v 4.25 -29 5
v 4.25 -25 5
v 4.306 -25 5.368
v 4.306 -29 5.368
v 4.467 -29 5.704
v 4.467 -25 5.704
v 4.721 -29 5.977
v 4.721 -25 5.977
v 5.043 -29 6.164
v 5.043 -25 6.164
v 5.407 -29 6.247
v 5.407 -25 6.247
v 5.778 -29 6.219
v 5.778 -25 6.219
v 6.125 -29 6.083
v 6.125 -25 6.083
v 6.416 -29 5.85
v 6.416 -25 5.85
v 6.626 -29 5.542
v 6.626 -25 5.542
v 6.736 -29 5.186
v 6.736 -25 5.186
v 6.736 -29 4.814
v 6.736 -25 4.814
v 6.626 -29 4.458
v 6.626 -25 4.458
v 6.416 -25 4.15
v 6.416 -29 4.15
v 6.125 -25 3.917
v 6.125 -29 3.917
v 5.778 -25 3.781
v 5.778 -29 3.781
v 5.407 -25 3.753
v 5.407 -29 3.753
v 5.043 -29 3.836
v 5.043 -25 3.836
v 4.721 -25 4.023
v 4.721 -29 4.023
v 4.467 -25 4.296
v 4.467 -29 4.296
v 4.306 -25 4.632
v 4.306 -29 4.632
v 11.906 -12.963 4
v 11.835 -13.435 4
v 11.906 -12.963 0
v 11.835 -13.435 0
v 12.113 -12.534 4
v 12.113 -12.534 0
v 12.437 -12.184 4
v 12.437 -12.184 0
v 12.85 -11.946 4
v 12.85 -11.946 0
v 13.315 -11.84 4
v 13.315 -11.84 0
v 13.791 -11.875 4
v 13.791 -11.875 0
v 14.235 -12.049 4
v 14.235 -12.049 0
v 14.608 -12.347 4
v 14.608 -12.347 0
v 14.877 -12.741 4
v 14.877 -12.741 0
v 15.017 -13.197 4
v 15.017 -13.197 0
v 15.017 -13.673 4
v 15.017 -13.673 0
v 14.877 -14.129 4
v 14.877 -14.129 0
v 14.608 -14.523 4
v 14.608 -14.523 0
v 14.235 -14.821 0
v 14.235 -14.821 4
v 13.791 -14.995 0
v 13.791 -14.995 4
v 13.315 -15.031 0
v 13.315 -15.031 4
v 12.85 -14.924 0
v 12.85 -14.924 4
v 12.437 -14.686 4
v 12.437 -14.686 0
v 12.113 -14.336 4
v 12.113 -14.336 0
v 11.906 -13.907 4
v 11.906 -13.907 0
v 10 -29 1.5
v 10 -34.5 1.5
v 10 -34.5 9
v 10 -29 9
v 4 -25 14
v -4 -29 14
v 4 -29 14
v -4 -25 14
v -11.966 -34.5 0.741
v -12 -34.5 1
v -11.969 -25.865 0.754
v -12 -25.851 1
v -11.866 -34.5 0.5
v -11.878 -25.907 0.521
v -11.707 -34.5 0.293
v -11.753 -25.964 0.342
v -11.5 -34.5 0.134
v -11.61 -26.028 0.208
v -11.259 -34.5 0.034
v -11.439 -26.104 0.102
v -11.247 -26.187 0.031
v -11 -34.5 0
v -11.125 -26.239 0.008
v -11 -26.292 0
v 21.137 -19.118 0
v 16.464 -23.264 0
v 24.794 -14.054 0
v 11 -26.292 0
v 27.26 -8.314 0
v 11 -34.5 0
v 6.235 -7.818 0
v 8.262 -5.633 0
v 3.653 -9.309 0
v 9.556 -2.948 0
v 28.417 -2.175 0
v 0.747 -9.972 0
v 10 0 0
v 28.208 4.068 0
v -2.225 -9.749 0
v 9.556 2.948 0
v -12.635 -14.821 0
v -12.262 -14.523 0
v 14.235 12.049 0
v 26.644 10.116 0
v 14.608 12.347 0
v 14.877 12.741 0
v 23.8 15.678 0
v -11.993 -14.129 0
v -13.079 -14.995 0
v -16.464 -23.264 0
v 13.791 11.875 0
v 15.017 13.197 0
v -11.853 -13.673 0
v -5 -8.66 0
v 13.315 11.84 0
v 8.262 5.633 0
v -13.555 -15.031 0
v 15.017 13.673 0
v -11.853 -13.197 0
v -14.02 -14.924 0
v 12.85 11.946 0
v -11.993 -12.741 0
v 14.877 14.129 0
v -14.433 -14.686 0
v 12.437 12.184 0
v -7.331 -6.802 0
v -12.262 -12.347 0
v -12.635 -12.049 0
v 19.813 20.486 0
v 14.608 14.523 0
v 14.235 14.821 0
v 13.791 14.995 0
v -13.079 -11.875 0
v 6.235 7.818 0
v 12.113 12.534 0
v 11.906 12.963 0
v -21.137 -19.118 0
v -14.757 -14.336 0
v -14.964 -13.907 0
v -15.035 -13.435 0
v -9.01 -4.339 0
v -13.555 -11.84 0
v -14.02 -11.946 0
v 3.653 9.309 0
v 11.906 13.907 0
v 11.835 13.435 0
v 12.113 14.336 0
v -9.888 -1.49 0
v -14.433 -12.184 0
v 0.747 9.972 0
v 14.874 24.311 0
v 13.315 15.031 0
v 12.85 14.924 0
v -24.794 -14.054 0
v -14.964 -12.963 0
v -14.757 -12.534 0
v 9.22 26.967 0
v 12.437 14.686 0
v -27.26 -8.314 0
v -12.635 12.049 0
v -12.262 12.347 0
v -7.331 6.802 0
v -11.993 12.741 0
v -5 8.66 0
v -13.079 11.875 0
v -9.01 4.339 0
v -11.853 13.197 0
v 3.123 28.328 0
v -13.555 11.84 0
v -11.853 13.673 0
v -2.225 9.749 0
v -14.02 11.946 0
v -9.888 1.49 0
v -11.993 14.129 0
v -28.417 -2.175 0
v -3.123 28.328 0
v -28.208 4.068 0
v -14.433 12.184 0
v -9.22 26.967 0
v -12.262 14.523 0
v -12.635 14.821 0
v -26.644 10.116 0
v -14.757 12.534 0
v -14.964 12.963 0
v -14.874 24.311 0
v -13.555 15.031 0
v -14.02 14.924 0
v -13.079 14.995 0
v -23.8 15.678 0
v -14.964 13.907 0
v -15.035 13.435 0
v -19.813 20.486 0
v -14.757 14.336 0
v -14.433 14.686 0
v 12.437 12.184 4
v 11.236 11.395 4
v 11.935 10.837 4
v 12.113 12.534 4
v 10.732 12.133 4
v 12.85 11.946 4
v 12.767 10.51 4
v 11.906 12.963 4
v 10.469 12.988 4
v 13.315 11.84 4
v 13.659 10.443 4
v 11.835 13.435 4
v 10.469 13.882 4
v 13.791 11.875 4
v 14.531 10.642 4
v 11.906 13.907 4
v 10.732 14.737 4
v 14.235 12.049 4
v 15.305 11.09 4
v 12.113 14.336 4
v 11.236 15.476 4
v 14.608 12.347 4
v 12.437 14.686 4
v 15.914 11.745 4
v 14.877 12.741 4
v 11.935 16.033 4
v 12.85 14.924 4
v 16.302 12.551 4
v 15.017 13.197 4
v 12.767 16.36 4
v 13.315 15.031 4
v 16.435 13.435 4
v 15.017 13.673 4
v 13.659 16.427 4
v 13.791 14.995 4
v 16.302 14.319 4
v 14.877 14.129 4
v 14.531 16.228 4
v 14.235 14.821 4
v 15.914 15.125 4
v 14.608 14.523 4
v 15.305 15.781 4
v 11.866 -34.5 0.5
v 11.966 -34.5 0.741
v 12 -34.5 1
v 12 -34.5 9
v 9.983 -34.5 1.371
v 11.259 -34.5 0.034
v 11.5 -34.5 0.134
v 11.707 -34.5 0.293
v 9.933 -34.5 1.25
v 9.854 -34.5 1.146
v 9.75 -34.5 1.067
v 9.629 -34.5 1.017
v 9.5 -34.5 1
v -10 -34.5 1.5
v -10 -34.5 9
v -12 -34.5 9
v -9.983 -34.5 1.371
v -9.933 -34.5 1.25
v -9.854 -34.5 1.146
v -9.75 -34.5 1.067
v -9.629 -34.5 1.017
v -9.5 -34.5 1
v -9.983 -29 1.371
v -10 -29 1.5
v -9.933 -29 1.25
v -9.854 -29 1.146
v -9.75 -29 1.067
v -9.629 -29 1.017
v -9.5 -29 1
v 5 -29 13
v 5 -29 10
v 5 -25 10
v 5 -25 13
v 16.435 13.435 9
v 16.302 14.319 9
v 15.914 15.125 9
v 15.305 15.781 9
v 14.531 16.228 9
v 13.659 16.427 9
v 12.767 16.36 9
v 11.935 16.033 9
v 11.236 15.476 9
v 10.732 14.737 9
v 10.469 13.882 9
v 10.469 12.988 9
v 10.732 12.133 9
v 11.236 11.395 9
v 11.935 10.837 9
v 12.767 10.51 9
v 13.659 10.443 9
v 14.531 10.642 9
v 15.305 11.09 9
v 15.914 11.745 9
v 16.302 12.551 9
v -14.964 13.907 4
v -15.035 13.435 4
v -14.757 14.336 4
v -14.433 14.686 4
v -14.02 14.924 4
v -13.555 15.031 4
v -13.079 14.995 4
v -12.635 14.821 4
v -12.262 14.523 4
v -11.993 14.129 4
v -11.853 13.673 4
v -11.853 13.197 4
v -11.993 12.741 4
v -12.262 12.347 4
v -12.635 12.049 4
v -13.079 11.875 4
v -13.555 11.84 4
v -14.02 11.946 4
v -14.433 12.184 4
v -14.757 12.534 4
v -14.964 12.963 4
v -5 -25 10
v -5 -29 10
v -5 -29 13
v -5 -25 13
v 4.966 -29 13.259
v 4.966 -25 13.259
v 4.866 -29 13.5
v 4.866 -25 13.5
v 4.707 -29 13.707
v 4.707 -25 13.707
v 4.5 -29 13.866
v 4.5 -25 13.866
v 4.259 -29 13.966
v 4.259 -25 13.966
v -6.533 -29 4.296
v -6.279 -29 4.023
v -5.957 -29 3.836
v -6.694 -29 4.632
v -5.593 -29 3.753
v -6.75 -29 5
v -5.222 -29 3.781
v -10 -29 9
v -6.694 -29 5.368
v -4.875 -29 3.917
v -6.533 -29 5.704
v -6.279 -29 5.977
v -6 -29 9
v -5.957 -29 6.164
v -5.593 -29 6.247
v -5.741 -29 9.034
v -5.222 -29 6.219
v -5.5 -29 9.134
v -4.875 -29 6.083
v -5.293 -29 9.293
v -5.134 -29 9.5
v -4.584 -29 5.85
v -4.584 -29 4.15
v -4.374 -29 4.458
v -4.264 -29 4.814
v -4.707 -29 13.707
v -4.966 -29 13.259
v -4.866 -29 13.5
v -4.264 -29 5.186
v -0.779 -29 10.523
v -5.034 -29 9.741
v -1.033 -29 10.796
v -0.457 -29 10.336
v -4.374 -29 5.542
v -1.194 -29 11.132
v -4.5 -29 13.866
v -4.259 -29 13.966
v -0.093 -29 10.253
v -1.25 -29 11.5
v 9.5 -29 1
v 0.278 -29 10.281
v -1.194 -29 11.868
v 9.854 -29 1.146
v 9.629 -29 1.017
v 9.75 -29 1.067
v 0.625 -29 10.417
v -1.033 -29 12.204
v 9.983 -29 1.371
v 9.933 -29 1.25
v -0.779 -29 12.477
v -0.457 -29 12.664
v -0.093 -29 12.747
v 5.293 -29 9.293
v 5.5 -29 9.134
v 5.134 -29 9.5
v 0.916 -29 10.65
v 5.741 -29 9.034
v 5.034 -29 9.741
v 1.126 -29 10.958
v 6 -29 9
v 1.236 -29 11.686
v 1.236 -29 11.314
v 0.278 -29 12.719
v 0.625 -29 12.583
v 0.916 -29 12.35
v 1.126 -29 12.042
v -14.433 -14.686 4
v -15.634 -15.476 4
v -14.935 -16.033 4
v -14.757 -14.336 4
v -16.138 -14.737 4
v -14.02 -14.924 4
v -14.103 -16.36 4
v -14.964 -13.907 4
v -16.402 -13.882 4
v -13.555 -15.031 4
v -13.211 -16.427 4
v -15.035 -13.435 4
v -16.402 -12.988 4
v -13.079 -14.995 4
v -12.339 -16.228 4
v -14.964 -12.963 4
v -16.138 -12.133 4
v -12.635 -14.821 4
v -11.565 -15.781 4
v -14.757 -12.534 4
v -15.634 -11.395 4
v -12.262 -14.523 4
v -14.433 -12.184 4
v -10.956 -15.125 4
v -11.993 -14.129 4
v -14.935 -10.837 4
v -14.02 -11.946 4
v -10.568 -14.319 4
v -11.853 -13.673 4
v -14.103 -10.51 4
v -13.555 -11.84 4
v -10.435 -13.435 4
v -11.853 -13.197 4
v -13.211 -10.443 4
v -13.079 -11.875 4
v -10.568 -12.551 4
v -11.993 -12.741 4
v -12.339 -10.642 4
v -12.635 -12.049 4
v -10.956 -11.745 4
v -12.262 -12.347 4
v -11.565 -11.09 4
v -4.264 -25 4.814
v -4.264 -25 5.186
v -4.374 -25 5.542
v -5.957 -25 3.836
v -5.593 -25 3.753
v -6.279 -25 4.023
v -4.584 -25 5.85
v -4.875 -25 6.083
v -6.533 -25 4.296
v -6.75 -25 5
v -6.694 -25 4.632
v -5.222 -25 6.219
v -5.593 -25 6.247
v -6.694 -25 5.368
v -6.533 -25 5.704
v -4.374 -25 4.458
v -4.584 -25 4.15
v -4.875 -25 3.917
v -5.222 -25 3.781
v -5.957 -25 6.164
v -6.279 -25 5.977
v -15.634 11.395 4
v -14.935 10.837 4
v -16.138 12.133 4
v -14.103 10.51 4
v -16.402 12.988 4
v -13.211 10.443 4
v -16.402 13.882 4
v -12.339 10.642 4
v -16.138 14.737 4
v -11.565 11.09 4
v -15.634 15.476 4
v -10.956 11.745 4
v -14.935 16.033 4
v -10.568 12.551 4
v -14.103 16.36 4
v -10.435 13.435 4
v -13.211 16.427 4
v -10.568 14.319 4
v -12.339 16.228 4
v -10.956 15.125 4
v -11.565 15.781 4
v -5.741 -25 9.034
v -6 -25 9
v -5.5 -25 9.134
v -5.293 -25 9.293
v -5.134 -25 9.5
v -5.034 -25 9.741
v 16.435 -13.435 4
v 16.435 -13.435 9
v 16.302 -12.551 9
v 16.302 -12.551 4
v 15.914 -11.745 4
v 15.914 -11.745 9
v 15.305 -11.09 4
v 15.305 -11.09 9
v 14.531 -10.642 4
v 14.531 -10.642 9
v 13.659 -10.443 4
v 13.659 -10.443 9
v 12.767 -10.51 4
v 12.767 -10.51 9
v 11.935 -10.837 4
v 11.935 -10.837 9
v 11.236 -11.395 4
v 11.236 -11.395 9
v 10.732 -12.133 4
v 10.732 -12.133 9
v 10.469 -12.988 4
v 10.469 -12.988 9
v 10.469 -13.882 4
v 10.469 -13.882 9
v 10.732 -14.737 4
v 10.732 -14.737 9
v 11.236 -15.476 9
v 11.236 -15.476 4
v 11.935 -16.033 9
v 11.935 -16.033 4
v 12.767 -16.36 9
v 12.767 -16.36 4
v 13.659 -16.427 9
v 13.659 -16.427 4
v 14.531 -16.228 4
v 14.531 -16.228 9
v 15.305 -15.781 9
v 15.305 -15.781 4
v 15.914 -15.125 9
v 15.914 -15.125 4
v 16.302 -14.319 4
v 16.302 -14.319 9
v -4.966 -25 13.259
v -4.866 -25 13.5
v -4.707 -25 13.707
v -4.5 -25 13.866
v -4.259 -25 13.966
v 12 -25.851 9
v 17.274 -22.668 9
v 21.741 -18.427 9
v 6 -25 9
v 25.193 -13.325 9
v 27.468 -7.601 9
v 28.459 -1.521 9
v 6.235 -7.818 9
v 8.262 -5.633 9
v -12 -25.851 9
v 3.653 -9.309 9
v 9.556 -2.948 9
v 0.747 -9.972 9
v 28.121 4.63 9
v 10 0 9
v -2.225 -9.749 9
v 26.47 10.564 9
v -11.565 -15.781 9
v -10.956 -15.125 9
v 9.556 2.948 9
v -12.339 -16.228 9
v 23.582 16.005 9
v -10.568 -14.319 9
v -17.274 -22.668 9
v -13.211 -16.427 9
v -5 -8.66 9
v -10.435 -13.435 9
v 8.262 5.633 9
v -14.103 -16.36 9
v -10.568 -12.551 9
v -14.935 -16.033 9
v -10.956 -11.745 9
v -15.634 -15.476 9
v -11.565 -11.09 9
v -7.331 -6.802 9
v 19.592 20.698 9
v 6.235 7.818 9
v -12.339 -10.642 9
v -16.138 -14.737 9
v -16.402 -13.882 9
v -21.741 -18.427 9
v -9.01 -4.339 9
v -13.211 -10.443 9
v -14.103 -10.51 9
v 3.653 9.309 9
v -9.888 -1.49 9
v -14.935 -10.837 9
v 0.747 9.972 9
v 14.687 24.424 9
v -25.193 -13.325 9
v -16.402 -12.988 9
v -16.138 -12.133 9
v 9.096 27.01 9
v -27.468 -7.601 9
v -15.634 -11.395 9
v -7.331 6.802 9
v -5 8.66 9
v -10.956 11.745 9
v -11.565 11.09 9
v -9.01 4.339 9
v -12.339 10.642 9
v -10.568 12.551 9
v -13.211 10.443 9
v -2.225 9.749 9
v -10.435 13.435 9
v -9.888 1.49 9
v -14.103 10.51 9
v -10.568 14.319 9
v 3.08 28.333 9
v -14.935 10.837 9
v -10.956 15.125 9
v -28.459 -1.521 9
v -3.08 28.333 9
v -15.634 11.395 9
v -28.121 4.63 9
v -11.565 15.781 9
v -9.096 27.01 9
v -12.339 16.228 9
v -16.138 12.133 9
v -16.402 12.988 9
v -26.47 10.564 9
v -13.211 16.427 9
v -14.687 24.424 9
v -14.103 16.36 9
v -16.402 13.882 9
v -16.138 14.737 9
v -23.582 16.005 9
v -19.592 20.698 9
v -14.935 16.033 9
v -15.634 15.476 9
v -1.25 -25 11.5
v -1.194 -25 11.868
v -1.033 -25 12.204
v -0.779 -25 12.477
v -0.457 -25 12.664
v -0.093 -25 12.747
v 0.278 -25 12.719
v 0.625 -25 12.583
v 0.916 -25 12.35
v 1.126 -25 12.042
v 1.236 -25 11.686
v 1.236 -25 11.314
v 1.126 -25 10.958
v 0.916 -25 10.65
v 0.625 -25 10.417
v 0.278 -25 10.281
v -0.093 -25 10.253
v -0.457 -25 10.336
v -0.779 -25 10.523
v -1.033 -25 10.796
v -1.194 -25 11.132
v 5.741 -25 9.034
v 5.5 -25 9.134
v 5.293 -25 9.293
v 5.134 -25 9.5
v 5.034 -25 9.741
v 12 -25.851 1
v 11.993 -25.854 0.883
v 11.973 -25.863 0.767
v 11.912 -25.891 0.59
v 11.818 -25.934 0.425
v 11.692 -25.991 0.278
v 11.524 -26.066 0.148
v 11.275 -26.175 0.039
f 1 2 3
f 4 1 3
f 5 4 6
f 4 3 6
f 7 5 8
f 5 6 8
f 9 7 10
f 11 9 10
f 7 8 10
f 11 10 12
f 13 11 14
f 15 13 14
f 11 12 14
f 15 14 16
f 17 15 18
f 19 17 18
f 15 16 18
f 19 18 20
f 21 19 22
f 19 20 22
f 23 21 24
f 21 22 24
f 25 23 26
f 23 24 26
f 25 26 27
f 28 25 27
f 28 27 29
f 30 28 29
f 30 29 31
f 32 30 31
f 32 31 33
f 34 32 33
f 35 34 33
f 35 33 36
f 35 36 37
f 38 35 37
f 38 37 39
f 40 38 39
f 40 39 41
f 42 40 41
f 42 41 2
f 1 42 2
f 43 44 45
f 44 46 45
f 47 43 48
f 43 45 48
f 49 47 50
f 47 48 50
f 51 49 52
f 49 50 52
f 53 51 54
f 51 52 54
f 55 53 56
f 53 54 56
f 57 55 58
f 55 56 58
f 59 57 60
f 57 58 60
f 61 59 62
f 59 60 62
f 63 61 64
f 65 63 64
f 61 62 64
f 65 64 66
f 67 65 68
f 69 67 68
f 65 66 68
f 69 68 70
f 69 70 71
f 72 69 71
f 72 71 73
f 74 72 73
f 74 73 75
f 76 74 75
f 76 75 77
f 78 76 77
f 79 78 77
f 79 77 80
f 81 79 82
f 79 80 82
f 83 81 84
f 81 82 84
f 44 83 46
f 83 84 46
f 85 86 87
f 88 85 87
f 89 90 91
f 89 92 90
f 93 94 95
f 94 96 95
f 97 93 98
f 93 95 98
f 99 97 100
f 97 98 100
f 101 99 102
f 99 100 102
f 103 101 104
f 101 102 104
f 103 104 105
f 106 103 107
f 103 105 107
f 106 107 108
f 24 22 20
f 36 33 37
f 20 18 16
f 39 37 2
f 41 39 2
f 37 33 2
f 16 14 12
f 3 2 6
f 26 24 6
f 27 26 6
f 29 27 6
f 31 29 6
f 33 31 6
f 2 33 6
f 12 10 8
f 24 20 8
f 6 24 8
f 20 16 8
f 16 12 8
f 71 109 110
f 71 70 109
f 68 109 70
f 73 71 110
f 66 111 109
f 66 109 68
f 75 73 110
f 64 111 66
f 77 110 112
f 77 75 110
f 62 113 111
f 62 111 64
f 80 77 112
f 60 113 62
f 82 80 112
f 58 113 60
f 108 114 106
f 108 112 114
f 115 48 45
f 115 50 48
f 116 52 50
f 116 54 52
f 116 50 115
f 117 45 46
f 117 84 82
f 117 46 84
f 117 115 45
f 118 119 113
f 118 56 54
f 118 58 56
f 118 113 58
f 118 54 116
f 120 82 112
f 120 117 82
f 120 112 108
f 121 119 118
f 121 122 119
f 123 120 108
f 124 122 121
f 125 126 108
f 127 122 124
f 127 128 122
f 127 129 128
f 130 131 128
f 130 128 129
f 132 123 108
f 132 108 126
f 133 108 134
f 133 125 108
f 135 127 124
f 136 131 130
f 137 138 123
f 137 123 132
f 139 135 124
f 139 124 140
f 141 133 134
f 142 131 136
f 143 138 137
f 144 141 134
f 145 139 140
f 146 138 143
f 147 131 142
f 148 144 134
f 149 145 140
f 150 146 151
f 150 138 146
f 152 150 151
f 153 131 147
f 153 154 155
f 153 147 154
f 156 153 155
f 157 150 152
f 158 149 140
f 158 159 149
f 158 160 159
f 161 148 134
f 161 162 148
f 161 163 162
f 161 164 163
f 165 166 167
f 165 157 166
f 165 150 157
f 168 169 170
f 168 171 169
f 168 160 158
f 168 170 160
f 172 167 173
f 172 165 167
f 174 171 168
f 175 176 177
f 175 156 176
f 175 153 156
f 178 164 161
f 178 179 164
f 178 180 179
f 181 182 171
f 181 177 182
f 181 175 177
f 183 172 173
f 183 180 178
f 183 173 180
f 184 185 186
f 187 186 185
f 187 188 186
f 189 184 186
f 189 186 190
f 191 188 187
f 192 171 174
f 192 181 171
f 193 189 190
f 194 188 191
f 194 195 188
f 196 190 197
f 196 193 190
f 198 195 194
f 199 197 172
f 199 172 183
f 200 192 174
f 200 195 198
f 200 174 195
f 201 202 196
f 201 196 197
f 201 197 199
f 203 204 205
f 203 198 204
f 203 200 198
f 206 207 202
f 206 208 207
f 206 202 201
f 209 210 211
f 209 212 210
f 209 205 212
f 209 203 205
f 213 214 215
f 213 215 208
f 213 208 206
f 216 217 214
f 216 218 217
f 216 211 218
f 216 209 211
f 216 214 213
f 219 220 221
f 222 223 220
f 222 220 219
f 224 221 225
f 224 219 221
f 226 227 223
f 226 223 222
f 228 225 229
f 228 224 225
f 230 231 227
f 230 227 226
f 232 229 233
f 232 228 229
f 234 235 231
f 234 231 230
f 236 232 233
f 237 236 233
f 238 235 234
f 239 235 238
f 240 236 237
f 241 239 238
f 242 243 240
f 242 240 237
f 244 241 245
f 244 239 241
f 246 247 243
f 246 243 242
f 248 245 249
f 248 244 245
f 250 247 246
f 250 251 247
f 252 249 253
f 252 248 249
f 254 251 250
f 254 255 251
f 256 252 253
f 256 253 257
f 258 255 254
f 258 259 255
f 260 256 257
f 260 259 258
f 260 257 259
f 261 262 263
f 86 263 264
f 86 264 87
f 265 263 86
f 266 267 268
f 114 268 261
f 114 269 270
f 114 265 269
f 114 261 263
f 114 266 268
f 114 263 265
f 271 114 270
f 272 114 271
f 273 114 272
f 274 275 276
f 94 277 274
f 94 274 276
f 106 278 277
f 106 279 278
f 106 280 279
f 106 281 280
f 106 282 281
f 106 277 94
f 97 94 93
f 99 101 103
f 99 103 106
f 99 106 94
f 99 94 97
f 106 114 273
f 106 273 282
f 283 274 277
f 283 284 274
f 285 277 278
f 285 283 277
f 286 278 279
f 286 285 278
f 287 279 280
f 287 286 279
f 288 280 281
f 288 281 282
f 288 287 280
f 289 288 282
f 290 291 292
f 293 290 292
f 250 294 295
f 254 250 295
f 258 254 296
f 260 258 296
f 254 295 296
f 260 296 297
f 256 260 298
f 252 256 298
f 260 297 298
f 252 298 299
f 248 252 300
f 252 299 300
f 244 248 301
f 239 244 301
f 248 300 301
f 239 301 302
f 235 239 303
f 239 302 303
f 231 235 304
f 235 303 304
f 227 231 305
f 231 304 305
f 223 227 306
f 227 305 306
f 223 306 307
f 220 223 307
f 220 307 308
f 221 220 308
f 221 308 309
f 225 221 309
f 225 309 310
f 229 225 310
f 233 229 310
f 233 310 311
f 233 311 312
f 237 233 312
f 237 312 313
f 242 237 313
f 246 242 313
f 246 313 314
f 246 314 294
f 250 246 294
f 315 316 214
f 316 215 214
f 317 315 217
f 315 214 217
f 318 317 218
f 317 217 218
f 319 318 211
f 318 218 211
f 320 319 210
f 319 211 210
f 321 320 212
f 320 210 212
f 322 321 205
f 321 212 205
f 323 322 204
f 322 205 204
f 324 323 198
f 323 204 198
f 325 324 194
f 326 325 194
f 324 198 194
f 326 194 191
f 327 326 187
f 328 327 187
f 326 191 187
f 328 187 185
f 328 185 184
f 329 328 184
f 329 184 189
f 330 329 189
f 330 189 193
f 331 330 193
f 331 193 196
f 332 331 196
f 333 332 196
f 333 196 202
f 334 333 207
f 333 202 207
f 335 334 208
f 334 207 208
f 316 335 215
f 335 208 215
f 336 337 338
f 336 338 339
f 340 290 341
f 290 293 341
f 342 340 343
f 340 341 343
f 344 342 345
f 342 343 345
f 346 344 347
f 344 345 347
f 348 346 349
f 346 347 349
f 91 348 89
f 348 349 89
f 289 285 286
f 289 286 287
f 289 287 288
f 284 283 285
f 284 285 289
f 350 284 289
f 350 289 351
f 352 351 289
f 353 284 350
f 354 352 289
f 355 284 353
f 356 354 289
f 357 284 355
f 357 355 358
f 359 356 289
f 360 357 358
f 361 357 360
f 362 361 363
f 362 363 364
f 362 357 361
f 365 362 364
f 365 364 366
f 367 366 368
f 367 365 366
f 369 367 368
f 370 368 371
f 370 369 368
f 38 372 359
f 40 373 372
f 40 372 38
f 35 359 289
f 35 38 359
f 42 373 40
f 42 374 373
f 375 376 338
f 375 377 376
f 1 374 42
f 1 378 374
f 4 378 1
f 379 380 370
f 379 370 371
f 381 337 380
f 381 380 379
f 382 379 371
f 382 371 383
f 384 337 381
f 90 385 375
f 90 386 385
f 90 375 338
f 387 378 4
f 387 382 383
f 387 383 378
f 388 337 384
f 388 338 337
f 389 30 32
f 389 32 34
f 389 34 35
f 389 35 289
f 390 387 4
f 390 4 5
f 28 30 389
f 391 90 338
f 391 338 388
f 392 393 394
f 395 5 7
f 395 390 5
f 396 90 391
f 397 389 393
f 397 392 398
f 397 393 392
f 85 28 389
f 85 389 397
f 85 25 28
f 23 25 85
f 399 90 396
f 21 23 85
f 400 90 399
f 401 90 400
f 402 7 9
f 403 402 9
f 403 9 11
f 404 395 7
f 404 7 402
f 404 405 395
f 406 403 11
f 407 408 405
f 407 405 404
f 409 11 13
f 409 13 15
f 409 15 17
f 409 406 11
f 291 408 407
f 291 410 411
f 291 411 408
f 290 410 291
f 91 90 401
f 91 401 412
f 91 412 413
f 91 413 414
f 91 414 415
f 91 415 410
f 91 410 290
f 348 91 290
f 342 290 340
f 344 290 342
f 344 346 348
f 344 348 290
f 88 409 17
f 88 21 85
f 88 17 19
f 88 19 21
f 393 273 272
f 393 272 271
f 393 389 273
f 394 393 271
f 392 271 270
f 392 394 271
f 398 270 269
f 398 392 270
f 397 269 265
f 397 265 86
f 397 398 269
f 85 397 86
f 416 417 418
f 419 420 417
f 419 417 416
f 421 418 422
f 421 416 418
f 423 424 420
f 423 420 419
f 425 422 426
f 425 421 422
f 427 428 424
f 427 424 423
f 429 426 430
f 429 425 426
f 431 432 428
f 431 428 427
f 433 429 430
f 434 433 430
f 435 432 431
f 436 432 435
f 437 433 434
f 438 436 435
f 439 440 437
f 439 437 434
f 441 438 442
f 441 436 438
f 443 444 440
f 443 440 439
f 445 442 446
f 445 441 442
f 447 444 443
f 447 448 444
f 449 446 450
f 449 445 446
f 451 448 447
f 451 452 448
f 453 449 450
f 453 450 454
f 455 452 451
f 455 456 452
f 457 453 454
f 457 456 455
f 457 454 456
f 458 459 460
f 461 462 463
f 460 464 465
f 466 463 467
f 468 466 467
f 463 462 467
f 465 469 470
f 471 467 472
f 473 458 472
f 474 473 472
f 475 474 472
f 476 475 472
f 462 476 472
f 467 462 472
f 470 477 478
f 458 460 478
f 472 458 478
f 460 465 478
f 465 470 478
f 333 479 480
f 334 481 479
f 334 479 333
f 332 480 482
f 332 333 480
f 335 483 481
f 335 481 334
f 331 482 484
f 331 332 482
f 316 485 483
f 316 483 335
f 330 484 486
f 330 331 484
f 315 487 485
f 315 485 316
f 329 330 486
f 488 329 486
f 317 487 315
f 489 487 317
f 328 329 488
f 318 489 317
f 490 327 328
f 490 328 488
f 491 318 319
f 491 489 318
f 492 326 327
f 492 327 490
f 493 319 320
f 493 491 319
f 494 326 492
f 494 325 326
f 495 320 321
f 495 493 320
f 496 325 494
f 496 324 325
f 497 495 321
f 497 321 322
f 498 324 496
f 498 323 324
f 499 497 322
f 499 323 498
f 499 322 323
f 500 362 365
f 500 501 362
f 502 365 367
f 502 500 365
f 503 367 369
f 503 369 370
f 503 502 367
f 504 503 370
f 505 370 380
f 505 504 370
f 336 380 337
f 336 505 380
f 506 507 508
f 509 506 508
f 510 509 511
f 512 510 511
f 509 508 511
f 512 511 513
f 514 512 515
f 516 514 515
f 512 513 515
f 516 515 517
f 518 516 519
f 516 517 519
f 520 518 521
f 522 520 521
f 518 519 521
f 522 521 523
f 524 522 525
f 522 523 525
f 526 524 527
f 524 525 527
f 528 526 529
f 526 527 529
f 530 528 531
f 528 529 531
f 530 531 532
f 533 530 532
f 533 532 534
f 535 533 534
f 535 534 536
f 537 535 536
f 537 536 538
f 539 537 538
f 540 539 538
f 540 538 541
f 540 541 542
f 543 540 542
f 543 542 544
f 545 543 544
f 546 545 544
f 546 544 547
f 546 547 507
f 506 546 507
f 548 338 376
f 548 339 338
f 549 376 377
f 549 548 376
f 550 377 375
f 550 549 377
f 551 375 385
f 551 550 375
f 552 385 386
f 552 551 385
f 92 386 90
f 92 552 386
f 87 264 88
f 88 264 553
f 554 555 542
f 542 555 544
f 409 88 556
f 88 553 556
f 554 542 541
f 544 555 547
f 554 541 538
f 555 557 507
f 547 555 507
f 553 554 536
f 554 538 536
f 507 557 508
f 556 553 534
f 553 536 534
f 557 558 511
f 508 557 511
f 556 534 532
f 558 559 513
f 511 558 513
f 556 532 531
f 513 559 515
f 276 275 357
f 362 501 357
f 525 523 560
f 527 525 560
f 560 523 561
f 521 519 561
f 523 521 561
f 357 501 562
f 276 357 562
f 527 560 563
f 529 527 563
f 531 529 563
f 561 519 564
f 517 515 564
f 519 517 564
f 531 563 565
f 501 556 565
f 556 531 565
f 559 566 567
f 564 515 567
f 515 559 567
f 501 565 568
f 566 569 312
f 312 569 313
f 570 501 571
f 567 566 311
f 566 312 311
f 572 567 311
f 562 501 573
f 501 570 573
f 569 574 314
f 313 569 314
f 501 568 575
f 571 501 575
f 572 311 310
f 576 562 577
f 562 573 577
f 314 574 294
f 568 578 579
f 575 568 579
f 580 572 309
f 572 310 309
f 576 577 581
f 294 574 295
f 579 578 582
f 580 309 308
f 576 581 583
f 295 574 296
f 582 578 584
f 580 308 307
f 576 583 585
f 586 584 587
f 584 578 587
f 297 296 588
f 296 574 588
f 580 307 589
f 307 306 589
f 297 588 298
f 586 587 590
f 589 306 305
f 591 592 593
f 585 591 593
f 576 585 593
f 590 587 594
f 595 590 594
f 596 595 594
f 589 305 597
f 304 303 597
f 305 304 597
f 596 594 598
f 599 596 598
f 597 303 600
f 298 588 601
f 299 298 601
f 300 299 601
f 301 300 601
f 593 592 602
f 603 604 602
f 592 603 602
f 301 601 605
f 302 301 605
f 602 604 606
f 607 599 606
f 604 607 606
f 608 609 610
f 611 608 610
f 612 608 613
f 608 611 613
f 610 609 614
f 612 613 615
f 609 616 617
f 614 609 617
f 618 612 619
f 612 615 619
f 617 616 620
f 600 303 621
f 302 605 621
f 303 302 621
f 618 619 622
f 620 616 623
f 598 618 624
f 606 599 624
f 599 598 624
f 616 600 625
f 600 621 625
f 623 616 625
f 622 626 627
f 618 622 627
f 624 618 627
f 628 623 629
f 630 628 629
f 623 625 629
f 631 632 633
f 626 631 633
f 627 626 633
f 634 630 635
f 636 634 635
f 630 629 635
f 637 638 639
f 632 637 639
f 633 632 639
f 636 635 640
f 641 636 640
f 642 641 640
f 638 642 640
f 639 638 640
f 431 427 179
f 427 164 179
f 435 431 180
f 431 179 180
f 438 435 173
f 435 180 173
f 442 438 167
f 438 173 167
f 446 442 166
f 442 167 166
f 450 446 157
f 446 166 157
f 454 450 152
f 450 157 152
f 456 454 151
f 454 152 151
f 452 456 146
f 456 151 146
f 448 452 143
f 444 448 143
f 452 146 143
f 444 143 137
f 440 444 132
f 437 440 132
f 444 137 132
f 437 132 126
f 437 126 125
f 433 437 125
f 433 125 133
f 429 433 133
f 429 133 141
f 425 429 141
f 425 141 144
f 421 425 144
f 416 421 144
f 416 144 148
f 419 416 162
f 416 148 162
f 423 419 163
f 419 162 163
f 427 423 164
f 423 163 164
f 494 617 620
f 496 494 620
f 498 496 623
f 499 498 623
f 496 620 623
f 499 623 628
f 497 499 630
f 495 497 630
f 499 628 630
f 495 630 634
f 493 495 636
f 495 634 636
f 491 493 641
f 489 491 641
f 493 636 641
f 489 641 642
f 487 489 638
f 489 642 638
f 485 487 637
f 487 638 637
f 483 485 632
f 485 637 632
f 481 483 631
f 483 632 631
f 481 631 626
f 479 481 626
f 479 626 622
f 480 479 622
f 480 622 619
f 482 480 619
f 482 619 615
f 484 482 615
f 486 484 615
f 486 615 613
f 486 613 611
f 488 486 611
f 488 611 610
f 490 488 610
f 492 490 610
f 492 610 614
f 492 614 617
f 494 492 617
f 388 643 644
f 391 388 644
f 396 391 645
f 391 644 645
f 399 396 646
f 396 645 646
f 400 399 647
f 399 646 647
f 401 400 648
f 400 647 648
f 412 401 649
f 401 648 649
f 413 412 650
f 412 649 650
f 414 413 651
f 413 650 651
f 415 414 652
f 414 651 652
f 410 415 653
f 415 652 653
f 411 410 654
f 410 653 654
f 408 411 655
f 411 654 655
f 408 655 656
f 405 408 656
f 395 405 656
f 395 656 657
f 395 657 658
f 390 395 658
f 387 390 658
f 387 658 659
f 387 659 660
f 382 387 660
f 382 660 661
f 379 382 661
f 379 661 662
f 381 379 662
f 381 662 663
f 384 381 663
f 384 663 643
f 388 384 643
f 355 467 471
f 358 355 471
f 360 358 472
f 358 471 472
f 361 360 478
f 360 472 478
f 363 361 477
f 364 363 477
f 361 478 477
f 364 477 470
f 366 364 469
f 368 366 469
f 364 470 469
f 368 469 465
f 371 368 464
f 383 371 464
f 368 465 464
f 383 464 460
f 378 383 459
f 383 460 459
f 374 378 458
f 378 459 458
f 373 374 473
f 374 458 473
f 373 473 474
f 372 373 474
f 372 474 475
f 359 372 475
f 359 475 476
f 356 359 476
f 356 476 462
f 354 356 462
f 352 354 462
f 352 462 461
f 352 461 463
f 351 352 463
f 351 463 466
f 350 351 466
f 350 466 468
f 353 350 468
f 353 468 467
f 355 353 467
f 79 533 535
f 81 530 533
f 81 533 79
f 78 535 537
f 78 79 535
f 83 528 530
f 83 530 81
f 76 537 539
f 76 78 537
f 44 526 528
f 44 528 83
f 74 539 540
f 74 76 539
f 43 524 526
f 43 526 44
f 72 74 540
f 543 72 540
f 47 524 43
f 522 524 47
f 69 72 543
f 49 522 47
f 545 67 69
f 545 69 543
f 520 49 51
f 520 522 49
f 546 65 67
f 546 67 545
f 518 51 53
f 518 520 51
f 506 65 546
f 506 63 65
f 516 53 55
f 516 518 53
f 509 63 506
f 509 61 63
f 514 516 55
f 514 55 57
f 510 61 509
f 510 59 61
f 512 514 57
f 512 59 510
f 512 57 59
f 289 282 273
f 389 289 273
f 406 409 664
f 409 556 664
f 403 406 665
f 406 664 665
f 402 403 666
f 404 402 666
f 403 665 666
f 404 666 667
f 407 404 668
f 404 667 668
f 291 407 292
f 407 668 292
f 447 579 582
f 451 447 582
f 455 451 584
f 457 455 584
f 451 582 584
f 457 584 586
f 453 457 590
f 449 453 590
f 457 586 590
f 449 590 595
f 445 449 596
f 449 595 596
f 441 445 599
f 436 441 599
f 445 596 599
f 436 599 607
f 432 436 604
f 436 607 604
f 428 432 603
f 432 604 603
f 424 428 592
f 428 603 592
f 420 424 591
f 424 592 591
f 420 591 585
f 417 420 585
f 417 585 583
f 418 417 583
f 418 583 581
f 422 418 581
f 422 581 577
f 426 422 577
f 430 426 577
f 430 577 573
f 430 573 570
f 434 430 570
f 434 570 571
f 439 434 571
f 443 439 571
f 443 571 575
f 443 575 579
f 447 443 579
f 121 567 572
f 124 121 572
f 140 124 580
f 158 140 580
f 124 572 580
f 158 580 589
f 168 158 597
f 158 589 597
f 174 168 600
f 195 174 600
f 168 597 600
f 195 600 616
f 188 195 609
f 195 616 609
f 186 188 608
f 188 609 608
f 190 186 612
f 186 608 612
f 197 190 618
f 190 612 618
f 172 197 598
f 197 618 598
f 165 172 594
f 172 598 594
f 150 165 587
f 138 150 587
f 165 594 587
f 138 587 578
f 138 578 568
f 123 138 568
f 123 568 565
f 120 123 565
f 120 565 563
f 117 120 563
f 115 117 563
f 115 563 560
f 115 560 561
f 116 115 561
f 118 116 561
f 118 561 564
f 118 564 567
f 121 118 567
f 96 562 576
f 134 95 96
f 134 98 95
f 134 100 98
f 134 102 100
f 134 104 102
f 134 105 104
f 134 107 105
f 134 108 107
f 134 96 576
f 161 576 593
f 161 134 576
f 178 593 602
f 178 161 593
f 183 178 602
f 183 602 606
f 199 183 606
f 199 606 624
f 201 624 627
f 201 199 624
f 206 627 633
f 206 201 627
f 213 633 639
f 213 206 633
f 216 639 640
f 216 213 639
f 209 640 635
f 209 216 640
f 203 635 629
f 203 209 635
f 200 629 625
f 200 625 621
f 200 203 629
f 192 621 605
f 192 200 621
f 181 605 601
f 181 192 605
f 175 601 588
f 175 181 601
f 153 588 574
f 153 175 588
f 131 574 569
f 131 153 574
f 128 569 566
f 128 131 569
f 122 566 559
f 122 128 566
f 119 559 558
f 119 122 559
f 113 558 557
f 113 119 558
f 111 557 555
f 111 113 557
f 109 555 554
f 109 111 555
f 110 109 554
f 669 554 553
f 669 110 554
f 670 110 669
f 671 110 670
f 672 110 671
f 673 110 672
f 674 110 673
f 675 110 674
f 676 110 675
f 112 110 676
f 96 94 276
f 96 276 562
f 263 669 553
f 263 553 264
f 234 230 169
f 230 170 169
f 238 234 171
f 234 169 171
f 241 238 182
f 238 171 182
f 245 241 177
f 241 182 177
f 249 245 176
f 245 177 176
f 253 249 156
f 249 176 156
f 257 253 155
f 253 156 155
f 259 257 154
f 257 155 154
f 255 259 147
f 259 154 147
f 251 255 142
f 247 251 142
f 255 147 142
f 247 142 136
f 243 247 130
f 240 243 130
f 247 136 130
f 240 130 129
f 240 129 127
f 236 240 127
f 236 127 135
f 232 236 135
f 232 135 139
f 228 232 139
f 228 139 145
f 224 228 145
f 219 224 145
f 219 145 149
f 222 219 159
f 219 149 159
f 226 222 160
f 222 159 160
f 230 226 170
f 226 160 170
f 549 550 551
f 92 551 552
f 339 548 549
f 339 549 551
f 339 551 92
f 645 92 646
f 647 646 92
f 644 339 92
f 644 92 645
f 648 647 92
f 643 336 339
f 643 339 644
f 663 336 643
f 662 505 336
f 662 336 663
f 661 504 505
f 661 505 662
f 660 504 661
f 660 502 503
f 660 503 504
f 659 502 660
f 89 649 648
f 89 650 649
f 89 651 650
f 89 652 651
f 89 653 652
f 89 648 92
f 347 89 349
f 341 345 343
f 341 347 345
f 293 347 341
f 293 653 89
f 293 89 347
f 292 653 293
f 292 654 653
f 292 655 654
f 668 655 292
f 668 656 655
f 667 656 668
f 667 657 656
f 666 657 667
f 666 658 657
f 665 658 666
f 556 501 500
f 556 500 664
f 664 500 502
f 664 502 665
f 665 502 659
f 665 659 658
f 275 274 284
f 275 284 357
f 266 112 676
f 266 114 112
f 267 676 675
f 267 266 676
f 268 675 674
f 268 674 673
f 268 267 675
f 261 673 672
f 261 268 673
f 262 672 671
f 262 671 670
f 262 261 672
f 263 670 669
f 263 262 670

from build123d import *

# Parameters (mm, degrees)
EXTRUDE_1_DEPTH              = 9
SKETCH_2_W                   = 20
SKETCH_2_H                   = 8
CUT_EXTRUDE_1_DEPTH          = 5.5
SKETCH_3_W                   = 10
SKETCH_3_H                   = 4
EXTRUDE_2_DEPTH              = 5
HOLE_WIZARD_20_0_20_1_D      = 20
HOLE_WIZARD_20_0_20_1_DEPTH  = 14
HOLE_WIZARD_2_5_2_5_1_D      = 2.5
HOLE_WIZARD_2_5_2_5_1_DEPTH  = 57.5
HOLE_WIZARD_2_5_2_5_2_D      = 2.5
HOLE_WIZARD_2_5_2_5_2_DEPTH  = 4
HOLE_WIZARD_M3_1_D           = 3.2
HOLE_WIZARD_M3_1_CBORE_D     = 6
HOLE_WIZARD_M3_1_CBORE_DEPTH = 5
FILLET_1_R                   = 0.5
FILLET_2_R                   = 1


with BuildPart() as part:
    # 草图1 → 凸台-拉伸1 (new body)
    with BuildSketch(Plane(origin=(0, 0, 0), x_dir=(-1, 0, 0), z_dir=(0, 0, -1))):
        with BuildLine():
            Line((-12, -25.850531909), (-12, -34.5))
            Line((-12, -34.5), (12, -34.5))
            Line((12, -34.5), (12, -25.850531909))
            ThreePointArc((12, -25.850531909), (0, 28.5), (-12, -25.850531909))
        make_face()
    extrude(amount=-EXTRUDE_1_DEPTH)

    # 草图2 → 切除-拉伸1 (cut)
    with BuildSketch(Plane.XZ.offset(34.5)):
        with Locations((0, 5)):
            Rectangle(SKETCH_2_W, SKETCH_2_H)
    extrude(amount=-CUT_EXTRUDE_1_DEPTH, mode=Mode.SUBTRACT)

    # 草图3 → 凸台-拉伸2 (add)
    with BuildSketch(Plane.XY.offset(9)):
        with Locations((0, -27)):
            Rectangle(SKETCH_3_W, SKETCH_3_H)
    extrude(amount=EXTRUDE_2_DEPTH)

    # Ø20.0 (20) 直径孔1
    with Locations(Plane(origin=(0, 0, 0), x_dir=(-1, 0, 0), z_dir=(0, 0, -1))):
        with Locations((0, 0)):
            Hole(HOLE_WIZARD_20_0_20_1_D / 2, depth=HOLE_WIZARD_20_0_20_1_DEPTH)

    # Ø2.5 (2.5) 直径孔1
    with Locations(Plane.XZ.offset(29)):
        with Locations((0, 11.5)):
            Hole(HOLE_WIZARD_2_5_2_5_1_D / 2, depth=HOLE_WIZARD_2_5_2_5_1_DEPTH)

    # Ø2.5 (2.5) 直径孔2
    with Locations(Plane.XZ.offset(29)):
        with Locations((5.5, 5), (-5.5, 5)):
            Hole(HOLE_WIZARD_2_5_2_5_2_D / 2, depth=HOLE_WIZARD_2_5_2_5_2_DEPTH)

    # M3 六角头机械螺钉的柱形沉头孔1 (through all)
    with Locations(Plane.XY.offset(9)):
        with Locations((-13.435028843, -13.435028843), (-13.435028843, 13.435028843), (13.435028843, 13.435028843), (13.435028843, -13.435028843)):
            CounterBoreHole(HOLE_WIZARD_M3_1_D / 2, HOLE_WIZARD_M3_1_CBORE_D / 2, HOLE_WIZARD_M3_1_CBORE_DEPTH)

    # 圆角1
    fillet_1_edges = [part.edges().sort_by_distance(p)[0] for p in [
        (10, -31.75, 1),
        (-10, -31.75, 1),
    ]]
    fillet(fillet_1_edges, radius=FILLET_1_R)

    # 圆角2
    fillet_2_edges = [part.edges().sort_by_distance(p)[0] for p in [
        (5, -27, 9),
        (-5, -27, 9),
        (5, -27, 14),
        (-5, -27, 14),
        (-12, -30.175265955, 0),
        (12, -30.175265955, 0),
    ]]
    fillet(fillet_2_edges, radius=FILLET_2_R)


solid = part.part
